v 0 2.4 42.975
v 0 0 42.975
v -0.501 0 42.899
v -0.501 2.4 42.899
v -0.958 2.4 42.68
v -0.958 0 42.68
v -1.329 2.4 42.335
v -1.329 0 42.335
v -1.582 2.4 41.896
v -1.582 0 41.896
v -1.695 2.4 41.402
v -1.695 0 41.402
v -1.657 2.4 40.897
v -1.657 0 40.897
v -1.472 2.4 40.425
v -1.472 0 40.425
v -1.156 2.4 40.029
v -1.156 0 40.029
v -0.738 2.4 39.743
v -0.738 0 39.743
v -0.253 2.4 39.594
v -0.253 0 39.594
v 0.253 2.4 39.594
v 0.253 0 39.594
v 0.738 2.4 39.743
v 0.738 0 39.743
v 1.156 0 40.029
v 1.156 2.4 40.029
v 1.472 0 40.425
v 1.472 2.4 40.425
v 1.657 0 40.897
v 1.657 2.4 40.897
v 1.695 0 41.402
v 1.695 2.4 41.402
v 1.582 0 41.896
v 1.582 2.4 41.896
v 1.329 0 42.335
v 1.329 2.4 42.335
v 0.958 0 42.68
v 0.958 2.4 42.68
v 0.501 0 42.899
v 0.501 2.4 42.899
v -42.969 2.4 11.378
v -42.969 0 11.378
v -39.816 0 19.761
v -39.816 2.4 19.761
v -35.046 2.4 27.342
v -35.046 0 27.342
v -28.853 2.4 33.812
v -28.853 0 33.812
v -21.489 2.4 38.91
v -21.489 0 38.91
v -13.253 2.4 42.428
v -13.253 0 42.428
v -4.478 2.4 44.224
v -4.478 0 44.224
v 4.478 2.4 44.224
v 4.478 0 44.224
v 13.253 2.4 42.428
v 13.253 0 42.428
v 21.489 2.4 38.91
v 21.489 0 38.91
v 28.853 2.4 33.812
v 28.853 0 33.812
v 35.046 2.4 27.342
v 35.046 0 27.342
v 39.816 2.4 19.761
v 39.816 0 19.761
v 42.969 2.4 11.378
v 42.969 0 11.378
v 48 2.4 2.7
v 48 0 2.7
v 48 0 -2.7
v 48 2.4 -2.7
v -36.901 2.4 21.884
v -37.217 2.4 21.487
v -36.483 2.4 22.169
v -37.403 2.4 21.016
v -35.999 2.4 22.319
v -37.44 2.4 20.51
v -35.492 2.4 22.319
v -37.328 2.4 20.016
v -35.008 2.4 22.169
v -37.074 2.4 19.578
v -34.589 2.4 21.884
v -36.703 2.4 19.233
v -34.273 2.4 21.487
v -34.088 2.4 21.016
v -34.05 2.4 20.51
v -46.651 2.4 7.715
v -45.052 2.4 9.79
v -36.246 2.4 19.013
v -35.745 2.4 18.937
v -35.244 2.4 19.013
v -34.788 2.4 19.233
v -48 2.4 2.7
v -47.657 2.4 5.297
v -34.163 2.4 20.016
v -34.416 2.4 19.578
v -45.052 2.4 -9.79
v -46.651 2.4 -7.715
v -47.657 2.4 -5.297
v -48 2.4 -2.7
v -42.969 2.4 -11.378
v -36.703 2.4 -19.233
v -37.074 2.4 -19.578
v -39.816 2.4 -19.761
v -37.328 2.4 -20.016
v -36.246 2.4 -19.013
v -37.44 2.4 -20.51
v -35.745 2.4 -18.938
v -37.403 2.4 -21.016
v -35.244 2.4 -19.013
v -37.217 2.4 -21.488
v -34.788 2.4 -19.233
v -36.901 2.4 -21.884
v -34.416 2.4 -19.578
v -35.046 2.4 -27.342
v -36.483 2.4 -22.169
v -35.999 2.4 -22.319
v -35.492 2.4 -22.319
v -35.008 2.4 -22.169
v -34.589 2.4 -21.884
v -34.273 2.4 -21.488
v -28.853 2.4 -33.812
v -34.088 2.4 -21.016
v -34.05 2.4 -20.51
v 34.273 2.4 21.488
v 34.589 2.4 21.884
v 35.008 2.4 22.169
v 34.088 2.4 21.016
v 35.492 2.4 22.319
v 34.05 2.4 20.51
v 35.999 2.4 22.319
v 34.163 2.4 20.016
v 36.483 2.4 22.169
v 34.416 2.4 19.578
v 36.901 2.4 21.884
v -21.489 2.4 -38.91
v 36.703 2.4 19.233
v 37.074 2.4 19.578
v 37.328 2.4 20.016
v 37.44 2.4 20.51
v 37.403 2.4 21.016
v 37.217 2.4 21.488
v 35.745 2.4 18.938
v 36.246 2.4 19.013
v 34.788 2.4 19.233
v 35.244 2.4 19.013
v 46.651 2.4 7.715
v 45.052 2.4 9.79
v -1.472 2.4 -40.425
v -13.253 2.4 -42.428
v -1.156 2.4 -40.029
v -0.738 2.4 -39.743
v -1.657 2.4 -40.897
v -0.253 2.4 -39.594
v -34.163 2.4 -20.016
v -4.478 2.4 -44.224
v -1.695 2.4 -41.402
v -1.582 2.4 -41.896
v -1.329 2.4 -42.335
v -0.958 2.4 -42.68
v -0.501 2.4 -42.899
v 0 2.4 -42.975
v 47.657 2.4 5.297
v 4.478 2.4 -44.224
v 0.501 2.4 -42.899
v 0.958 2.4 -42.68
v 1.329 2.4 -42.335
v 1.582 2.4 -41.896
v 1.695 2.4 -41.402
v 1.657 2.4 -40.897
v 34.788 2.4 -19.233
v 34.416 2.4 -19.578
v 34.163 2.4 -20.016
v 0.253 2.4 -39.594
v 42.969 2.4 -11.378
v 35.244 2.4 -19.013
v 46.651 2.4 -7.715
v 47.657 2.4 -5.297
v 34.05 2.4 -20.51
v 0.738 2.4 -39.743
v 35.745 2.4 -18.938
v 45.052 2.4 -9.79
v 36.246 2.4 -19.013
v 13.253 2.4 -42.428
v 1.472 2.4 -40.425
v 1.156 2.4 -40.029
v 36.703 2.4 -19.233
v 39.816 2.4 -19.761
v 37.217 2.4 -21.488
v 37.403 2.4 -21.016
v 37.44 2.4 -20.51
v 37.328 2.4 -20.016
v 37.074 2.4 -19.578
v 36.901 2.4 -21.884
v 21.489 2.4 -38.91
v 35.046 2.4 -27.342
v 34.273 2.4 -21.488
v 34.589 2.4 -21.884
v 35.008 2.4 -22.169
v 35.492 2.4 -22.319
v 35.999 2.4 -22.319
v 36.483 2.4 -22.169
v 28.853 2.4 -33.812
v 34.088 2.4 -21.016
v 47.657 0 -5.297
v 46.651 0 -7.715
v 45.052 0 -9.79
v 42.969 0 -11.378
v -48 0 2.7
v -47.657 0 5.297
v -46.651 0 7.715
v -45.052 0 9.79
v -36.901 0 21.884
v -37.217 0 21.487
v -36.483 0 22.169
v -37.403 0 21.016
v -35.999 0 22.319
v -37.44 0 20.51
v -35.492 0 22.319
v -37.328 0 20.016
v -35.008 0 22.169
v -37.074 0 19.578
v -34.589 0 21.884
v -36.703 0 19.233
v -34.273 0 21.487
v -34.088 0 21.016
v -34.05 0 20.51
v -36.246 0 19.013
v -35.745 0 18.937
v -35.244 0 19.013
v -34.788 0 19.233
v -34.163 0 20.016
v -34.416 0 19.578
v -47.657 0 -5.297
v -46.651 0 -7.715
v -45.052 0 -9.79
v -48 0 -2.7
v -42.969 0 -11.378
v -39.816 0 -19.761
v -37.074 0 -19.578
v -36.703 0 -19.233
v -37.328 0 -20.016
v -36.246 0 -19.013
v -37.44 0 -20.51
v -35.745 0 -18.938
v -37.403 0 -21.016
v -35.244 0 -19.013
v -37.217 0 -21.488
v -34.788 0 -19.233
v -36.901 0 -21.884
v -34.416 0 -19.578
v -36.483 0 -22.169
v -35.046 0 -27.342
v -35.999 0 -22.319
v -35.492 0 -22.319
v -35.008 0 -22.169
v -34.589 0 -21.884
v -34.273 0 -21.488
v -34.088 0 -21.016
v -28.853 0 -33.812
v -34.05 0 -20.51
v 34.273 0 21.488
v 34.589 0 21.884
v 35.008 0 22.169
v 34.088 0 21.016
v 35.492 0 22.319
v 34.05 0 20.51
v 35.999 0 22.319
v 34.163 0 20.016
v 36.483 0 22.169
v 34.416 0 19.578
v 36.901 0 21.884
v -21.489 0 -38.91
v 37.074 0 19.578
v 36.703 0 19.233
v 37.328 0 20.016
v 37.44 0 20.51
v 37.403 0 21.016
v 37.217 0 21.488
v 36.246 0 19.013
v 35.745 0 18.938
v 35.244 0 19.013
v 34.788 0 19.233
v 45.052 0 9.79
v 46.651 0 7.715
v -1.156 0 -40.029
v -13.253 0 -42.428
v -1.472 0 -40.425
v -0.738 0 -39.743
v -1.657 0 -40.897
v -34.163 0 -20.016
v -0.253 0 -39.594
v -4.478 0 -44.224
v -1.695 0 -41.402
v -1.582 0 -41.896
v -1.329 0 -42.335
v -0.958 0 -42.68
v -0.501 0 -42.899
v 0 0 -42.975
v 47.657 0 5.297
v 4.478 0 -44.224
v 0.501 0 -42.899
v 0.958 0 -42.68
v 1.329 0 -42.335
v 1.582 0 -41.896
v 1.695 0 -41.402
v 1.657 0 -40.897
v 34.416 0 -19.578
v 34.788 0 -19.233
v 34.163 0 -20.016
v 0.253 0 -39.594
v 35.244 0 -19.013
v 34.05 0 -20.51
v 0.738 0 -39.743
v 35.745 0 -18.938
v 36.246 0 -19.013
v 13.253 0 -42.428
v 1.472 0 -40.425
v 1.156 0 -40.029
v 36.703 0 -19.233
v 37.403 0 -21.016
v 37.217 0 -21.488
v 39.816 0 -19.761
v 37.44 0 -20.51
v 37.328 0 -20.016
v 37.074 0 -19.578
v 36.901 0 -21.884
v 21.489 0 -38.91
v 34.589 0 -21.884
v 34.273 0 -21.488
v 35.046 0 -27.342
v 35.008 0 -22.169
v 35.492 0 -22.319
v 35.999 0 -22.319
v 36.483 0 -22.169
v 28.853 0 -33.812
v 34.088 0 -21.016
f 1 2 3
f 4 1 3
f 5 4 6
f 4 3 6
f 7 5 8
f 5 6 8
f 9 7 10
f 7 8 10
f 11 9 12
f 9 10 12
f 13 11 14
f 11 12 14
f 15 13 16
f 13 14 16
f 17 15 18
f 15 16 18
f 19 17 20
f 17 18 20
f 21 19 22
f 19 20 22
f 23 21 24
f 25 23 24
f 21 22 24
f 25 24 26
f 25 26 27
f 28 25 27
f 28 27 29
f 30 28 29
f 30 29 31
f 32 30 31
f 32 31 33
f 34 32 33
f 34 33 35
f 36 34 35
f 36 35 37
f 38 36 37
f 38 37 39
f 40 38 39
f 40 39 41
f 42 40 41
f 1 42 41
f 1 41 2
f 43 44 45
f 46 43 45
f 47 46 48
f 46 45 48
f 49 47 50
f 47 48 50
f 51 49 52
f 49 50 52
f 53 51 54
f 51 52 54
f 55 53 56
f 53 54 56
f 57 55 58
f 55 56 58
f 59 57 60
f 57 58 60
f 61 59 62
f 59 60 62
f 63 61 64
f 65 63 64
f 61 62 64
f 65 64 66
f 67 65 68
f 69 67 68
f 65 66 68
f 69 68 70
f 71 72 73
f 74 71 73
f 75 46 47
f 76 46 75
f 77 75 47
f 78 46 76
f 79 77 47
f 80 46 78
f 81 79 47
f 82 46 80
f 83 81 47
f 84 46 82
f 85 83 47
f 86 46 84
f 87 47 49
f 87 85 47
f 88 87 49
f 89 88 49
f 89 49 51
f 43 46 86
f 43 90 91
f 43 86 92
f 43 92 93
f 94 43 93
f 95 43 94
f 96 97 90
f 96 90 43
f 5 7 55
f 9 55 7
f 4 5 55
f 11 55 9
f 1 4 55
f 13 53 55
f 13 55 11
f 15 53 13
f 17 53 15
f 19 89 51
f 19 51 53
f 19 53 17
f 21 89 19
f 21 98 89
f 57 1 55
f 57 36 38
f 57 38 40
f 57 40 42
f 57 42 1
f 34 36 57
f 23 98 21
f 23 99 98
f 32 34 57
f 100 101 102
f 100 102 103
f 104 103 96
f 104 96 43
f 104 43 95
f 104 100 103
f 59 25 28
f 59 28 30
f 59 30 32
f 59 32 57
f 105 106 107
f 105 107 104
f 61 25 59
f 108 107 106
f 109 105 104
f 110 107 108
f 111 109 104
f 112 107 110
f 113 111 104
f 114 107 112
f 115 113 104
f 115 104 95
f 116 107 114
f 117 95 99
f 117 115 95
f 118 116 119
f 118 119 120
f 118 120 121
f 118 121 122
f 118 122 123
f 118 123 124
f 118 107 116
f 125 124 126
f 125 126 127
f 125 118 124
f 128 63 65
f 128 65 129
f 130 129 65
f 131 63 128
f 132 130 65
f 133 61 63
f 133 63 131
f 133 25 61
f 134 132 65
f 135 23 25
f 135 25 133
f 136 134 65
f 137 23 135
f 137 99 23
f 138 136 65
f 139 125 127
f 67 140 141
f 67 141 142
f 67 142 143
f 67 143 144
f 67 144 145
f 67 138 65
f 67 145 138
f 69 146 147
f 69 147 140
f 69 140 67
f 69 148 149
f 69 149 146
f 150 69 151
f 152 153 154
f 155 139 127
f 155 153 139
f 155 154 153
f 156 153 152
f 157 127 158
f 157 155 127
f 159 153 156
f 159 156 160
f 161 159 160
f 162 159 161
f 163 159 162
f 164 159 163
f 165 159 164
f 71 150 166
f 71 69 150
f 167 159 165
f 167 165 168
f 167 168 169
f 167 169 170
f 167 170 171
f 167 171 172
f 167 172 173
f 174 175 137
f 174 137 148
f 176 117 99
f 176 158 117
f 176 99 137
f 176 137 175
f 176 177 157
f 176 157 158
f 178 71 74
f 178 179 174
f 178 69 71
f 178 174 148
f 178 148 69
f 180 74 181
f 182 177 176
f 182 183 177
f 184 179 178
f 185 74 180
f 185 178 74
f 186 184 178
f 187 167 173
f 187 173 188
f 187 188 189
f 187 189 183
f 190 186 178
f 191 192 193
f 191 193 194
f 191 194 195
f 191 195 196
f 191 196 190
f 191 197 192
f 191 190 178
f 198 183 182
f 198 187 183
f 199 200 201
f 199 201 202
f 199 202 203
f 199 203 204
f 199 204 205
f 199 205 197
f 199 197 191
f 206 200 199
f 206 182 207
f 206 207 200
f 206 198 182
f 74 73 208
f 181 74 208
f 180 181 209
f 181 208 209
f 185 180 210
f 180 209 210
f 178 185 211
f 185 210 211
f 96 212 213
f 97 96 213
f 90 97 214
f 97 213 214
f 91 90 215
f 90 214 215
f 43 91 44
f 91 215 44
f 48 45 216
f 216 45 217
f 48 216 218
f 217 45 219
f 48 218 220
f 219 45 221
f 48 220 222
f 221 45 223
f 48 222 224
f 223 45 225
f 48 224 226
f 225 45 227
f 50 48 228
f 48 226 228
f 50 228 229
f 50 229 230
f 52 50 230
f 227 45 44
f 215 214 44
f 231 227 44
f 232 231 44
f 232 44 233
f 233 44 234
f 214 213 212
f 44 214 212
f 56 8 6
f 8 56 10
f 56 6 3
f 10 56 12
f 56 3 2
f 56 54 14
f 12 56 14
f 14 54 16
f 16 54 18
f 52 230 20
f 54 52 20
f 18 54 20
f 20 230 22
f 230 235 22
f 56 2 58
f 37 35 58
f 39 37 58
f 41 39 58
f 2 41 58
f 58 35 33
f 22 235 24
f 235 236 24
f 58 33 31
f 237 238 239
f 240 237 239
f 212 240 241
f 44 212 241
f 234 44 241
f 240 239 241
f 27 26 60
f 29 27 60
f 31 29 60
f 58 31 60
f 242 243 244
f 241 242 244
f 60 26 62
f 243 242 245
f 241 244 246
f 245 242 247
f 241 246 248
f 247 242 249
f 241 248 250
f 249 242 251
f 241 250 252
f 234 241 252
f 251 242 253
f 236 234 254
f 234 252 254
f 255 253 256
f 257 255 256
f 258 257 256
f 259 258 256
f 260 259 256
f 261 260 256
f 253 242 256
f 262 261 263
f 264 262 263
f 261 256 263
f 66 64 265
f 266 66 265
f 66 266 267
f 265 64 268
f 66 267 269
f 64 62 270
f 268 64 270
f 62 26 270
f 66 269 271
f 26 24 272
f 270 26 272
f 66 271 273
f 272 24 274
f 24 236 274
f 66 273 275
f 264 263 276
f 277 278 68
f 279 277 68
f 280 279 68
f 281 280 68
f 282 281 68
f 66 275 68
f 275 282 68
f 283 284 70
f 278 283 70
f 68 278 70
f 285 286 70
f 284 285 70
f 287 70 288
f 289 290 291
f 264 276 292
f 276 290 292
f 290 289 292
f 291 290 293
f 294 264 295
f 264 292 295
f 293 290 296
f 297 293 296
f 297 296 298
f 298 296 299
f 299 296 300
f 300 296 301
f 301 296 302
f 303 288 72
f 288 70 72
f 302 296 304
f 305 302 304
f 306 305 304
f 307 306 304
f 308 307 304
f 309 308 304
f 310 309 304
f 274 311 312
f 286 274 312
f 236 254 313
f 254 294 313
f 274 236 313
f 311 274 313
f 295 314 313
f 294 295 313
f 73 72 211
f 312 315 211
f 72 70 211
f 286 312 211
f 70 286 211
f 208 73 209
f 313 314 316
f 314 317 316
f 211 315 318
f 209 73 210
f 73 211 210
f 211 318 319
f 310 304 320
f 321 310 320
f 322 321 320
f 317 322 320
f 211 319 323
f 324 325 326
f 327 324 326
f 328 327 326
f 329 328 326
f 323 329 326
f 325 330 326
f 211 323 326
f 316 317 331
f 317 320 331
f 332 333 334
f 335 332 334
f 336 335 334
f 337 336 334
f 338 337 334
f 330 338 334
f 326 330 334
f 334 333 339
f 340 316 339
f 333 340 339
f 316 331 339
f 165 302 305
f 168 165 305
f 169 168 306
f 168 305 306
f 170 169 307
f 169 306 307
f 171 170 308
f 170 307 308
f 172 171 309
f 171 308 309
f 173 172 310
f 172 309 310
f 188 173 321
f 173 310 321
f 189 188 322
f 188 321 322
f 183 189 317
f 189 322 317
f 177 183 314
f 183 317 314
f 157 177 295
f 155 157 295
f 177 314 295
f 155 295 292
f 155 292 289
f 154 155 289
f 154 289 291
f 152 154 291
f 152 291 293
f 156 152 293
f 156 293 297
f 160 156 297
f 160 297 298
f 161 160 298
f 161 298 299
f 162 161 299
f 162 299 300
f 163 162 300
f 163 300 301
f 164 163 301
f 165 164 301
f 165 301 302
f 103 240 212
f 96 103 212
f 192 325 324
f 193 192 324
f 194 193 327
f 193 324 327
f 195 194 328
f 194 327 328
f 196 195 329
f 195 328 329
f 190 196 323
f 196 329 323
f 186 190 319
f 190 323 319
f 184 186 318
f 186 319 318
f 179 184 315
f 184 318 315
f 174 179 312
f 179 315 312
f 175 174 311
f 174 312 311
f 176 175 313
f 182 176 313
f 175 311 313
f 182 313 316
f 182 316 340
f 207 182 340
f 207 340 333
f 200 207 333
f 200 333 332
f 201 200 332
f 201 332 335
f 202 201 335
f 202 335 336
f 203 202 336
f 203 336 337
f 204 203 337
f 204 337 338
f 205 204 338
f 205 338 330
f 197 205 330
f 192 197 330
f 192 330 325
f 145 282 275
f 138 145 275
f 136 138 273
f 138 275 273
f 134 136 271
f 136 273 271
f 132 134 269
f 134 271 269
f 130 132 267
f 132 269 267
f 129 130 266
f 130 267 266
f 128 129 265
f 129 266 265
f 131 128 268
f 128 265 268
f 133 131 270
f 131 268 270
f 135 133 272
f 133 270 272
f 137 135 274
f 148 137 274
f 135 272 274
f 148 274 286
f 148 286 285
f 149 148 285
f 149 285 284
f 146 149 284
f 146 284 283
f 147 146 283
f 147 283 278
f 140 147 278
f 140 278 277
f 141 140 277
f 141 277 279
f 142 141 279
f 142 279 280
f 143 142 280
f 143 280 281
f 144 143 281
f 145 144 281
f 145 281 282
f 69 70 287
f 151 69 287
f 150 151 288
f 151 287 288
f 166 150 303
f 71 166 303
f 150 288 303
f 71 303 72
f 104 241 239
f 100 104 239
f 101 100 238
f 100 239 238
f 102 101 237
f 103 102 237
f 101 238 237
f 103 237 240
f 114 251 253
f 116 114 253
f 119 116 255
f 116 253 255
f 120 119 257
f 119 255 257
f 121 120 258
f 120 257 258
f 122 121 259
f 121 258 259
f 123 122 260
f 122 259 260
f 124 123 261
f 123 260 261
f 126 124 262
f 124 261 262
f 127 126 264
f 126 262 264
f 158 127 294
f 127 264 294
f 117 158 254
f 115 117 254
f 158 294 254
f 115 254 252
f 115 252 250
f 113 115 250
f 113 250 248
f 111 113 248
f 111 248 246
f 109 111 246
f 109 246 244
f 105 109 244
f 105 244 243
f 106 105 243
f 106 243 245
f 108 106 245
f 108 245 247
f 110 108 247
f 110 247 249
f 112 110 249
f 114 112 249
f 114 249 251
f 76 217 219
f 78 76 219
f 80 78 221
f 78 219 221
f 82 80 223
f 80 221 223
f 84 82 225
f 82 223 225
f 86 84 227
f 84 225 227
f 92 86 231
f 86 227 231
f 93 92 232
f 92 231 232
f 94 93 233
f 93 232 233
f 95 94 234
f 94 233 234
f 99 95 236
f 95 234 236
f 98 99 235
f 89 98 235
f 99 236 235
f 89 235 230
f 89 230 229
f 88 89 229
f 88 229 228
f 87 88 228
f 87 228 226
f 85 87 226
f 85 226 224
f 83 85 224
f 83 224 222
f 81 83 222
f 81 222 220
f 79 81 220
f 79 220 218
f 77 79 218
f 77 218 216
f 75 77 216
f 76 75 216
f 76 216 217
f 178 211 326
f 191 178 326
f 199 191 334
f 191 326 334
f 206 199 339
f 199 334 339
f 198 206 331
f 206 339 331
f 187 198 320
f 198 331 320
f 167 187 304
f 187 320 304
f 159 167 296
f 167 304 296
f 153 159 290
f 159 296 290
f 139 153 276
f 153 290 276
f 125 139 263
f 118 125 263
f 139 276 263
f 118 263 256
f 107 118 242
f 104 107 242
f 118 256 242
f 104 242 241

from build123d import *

# Parameters (mm, degrees)
BOSS_EXTRUDE1_DEPTH  = 2.4
M3_CLEARANCE_HOLE1_D = 3.4
CIRPATTERN1_COUNT    = 6


with BuildPart() as part:
    # Sketch1 → Boss-Extrude1 (new body)
    with BuildSketch(Plane(origin=(0, 0, 0), x_dir=(1, 0, 0), z_dir=(0, 1, 0))):
        with BuildLine():
            ThreePointArc((-42.969094344, -11.378024049), (-44.45, 0), (-42.969094344, 11.378024049))
            ThreePointArc((-42.969094344, 11.378024049), (-46.651327743, 7.715429023), (-48, 2.7))
            Line((-48, 2.7), (-48, -2.7))
            ThreePointArc((-48, -2.7), (-46.651327743, -7.715429023), (-42.969094344, -11.378024049))
        make_face()
        with BuildLine():
            Line((38, 12.7), (-38, 12.7))
            ThreePointArc((-38, 12.7), (-40.570968641, 12.363856386), (-42.969094344, 11.378024049))
            ThreePointArc((-42.969094344, 11.378024049), (-44.45, 0), (-42.969094344, -11.378024049))
            ThreePointArc((-42.969094344, -11.378024049), (-40.570968641, -12.363856386), (-38, -12.7))
            Line((-38, -12.7), (38, -12.7))
            ThreePointArc((38, -12.7), (40.570968641, -12.363856386), (42.969094344, -11.378024049))
            ThreePointArc((42.969094344, -11.378024049), (44.078218791, -5.736996445), (44.45, 0))
            ThreePointArc((44.45, 0), (44.078218791, 5.736996445), (42.969094344, 11.378024049))
            ThreePointArc((42.969094344, 11.378024049), (40.570968641, 12.363856386), (38, 12.7))
        make_face()
        with BuildLine():
            ThreePointArc((-38, -12.7), (-40.570968641, -12.363856386), (-42.969094344, -11.378024049))
            ThreePointArc((-42.969094344, -11.378024049), (0, -44.45), (42.969094344, -11.378024049))
            ThreePointArc((42.969094344, -11.378024049), (40.570968641, -12.363856386), (38, -12.7))
            Line((38, -12.7), (-38, -12.7))
        make_face()
        with BuildLine():
            ThreePointArc((-42.969094344, 11.378024049), (-40.570968641, 12.363856386), (-38, 12.7))
            Line((-38, 12.7), (38, 12.7))
            ThreePointArc((38, 12.7), (40.570968641, 12.363856386), (42.969094344, 11.378024049))
            ThreePointArc((42.969094344, 11.378024049), (0, 44.45), (-42.969094344, 11.378024049))
        make_face()
        with BuildLine():
            ThreePointArc((48, 2.7), (46.651327743, 7.715429023), (42.969094344, 11.378024049))
            ThreePointArc((42.969094344, 11.378024049), (44.078218791, 5.736996445), (44.45, 0))
            ThreePointArc((44.45, 0), (44.078218791, -5.736996445), (42.969094344, -11.378024049))
            ThreePointArc((42.969094344, -11.378024049), (46.651327743, -7.715429023), (48, -2.7))
            Line((48, -2.7), (48, 2.7))
        make_face()
    extrude(amount=BOSS_EXTRUDE1_DEPTH)

    # M3 Clearance Hole1 (through all)
    with Locations(Plane(origin=(0, 2.4, -41.275), x_dir=(0, 0, 1), z_dir=(0, 1, 0))):
        with Locations((0, 0)):
            m3_clearance_hole1 = Hole(M3_CLEARANCE_HOLE1_D / 2)

    # CirPattern1: M3 Clearance Hole1 ×6 about axis
    cirpattern1_axis = Axis((0, 0, 0), (0, 1, 0))
    for i in range(1, CIRPATTERN1_COUNT):
        add(m3_clearance_hole1.rotate(cirpattern1_axis, i * 360 / CIRPATTERN1_COUNT), mode=Mode.SUBTRACT)


solid = part.part
